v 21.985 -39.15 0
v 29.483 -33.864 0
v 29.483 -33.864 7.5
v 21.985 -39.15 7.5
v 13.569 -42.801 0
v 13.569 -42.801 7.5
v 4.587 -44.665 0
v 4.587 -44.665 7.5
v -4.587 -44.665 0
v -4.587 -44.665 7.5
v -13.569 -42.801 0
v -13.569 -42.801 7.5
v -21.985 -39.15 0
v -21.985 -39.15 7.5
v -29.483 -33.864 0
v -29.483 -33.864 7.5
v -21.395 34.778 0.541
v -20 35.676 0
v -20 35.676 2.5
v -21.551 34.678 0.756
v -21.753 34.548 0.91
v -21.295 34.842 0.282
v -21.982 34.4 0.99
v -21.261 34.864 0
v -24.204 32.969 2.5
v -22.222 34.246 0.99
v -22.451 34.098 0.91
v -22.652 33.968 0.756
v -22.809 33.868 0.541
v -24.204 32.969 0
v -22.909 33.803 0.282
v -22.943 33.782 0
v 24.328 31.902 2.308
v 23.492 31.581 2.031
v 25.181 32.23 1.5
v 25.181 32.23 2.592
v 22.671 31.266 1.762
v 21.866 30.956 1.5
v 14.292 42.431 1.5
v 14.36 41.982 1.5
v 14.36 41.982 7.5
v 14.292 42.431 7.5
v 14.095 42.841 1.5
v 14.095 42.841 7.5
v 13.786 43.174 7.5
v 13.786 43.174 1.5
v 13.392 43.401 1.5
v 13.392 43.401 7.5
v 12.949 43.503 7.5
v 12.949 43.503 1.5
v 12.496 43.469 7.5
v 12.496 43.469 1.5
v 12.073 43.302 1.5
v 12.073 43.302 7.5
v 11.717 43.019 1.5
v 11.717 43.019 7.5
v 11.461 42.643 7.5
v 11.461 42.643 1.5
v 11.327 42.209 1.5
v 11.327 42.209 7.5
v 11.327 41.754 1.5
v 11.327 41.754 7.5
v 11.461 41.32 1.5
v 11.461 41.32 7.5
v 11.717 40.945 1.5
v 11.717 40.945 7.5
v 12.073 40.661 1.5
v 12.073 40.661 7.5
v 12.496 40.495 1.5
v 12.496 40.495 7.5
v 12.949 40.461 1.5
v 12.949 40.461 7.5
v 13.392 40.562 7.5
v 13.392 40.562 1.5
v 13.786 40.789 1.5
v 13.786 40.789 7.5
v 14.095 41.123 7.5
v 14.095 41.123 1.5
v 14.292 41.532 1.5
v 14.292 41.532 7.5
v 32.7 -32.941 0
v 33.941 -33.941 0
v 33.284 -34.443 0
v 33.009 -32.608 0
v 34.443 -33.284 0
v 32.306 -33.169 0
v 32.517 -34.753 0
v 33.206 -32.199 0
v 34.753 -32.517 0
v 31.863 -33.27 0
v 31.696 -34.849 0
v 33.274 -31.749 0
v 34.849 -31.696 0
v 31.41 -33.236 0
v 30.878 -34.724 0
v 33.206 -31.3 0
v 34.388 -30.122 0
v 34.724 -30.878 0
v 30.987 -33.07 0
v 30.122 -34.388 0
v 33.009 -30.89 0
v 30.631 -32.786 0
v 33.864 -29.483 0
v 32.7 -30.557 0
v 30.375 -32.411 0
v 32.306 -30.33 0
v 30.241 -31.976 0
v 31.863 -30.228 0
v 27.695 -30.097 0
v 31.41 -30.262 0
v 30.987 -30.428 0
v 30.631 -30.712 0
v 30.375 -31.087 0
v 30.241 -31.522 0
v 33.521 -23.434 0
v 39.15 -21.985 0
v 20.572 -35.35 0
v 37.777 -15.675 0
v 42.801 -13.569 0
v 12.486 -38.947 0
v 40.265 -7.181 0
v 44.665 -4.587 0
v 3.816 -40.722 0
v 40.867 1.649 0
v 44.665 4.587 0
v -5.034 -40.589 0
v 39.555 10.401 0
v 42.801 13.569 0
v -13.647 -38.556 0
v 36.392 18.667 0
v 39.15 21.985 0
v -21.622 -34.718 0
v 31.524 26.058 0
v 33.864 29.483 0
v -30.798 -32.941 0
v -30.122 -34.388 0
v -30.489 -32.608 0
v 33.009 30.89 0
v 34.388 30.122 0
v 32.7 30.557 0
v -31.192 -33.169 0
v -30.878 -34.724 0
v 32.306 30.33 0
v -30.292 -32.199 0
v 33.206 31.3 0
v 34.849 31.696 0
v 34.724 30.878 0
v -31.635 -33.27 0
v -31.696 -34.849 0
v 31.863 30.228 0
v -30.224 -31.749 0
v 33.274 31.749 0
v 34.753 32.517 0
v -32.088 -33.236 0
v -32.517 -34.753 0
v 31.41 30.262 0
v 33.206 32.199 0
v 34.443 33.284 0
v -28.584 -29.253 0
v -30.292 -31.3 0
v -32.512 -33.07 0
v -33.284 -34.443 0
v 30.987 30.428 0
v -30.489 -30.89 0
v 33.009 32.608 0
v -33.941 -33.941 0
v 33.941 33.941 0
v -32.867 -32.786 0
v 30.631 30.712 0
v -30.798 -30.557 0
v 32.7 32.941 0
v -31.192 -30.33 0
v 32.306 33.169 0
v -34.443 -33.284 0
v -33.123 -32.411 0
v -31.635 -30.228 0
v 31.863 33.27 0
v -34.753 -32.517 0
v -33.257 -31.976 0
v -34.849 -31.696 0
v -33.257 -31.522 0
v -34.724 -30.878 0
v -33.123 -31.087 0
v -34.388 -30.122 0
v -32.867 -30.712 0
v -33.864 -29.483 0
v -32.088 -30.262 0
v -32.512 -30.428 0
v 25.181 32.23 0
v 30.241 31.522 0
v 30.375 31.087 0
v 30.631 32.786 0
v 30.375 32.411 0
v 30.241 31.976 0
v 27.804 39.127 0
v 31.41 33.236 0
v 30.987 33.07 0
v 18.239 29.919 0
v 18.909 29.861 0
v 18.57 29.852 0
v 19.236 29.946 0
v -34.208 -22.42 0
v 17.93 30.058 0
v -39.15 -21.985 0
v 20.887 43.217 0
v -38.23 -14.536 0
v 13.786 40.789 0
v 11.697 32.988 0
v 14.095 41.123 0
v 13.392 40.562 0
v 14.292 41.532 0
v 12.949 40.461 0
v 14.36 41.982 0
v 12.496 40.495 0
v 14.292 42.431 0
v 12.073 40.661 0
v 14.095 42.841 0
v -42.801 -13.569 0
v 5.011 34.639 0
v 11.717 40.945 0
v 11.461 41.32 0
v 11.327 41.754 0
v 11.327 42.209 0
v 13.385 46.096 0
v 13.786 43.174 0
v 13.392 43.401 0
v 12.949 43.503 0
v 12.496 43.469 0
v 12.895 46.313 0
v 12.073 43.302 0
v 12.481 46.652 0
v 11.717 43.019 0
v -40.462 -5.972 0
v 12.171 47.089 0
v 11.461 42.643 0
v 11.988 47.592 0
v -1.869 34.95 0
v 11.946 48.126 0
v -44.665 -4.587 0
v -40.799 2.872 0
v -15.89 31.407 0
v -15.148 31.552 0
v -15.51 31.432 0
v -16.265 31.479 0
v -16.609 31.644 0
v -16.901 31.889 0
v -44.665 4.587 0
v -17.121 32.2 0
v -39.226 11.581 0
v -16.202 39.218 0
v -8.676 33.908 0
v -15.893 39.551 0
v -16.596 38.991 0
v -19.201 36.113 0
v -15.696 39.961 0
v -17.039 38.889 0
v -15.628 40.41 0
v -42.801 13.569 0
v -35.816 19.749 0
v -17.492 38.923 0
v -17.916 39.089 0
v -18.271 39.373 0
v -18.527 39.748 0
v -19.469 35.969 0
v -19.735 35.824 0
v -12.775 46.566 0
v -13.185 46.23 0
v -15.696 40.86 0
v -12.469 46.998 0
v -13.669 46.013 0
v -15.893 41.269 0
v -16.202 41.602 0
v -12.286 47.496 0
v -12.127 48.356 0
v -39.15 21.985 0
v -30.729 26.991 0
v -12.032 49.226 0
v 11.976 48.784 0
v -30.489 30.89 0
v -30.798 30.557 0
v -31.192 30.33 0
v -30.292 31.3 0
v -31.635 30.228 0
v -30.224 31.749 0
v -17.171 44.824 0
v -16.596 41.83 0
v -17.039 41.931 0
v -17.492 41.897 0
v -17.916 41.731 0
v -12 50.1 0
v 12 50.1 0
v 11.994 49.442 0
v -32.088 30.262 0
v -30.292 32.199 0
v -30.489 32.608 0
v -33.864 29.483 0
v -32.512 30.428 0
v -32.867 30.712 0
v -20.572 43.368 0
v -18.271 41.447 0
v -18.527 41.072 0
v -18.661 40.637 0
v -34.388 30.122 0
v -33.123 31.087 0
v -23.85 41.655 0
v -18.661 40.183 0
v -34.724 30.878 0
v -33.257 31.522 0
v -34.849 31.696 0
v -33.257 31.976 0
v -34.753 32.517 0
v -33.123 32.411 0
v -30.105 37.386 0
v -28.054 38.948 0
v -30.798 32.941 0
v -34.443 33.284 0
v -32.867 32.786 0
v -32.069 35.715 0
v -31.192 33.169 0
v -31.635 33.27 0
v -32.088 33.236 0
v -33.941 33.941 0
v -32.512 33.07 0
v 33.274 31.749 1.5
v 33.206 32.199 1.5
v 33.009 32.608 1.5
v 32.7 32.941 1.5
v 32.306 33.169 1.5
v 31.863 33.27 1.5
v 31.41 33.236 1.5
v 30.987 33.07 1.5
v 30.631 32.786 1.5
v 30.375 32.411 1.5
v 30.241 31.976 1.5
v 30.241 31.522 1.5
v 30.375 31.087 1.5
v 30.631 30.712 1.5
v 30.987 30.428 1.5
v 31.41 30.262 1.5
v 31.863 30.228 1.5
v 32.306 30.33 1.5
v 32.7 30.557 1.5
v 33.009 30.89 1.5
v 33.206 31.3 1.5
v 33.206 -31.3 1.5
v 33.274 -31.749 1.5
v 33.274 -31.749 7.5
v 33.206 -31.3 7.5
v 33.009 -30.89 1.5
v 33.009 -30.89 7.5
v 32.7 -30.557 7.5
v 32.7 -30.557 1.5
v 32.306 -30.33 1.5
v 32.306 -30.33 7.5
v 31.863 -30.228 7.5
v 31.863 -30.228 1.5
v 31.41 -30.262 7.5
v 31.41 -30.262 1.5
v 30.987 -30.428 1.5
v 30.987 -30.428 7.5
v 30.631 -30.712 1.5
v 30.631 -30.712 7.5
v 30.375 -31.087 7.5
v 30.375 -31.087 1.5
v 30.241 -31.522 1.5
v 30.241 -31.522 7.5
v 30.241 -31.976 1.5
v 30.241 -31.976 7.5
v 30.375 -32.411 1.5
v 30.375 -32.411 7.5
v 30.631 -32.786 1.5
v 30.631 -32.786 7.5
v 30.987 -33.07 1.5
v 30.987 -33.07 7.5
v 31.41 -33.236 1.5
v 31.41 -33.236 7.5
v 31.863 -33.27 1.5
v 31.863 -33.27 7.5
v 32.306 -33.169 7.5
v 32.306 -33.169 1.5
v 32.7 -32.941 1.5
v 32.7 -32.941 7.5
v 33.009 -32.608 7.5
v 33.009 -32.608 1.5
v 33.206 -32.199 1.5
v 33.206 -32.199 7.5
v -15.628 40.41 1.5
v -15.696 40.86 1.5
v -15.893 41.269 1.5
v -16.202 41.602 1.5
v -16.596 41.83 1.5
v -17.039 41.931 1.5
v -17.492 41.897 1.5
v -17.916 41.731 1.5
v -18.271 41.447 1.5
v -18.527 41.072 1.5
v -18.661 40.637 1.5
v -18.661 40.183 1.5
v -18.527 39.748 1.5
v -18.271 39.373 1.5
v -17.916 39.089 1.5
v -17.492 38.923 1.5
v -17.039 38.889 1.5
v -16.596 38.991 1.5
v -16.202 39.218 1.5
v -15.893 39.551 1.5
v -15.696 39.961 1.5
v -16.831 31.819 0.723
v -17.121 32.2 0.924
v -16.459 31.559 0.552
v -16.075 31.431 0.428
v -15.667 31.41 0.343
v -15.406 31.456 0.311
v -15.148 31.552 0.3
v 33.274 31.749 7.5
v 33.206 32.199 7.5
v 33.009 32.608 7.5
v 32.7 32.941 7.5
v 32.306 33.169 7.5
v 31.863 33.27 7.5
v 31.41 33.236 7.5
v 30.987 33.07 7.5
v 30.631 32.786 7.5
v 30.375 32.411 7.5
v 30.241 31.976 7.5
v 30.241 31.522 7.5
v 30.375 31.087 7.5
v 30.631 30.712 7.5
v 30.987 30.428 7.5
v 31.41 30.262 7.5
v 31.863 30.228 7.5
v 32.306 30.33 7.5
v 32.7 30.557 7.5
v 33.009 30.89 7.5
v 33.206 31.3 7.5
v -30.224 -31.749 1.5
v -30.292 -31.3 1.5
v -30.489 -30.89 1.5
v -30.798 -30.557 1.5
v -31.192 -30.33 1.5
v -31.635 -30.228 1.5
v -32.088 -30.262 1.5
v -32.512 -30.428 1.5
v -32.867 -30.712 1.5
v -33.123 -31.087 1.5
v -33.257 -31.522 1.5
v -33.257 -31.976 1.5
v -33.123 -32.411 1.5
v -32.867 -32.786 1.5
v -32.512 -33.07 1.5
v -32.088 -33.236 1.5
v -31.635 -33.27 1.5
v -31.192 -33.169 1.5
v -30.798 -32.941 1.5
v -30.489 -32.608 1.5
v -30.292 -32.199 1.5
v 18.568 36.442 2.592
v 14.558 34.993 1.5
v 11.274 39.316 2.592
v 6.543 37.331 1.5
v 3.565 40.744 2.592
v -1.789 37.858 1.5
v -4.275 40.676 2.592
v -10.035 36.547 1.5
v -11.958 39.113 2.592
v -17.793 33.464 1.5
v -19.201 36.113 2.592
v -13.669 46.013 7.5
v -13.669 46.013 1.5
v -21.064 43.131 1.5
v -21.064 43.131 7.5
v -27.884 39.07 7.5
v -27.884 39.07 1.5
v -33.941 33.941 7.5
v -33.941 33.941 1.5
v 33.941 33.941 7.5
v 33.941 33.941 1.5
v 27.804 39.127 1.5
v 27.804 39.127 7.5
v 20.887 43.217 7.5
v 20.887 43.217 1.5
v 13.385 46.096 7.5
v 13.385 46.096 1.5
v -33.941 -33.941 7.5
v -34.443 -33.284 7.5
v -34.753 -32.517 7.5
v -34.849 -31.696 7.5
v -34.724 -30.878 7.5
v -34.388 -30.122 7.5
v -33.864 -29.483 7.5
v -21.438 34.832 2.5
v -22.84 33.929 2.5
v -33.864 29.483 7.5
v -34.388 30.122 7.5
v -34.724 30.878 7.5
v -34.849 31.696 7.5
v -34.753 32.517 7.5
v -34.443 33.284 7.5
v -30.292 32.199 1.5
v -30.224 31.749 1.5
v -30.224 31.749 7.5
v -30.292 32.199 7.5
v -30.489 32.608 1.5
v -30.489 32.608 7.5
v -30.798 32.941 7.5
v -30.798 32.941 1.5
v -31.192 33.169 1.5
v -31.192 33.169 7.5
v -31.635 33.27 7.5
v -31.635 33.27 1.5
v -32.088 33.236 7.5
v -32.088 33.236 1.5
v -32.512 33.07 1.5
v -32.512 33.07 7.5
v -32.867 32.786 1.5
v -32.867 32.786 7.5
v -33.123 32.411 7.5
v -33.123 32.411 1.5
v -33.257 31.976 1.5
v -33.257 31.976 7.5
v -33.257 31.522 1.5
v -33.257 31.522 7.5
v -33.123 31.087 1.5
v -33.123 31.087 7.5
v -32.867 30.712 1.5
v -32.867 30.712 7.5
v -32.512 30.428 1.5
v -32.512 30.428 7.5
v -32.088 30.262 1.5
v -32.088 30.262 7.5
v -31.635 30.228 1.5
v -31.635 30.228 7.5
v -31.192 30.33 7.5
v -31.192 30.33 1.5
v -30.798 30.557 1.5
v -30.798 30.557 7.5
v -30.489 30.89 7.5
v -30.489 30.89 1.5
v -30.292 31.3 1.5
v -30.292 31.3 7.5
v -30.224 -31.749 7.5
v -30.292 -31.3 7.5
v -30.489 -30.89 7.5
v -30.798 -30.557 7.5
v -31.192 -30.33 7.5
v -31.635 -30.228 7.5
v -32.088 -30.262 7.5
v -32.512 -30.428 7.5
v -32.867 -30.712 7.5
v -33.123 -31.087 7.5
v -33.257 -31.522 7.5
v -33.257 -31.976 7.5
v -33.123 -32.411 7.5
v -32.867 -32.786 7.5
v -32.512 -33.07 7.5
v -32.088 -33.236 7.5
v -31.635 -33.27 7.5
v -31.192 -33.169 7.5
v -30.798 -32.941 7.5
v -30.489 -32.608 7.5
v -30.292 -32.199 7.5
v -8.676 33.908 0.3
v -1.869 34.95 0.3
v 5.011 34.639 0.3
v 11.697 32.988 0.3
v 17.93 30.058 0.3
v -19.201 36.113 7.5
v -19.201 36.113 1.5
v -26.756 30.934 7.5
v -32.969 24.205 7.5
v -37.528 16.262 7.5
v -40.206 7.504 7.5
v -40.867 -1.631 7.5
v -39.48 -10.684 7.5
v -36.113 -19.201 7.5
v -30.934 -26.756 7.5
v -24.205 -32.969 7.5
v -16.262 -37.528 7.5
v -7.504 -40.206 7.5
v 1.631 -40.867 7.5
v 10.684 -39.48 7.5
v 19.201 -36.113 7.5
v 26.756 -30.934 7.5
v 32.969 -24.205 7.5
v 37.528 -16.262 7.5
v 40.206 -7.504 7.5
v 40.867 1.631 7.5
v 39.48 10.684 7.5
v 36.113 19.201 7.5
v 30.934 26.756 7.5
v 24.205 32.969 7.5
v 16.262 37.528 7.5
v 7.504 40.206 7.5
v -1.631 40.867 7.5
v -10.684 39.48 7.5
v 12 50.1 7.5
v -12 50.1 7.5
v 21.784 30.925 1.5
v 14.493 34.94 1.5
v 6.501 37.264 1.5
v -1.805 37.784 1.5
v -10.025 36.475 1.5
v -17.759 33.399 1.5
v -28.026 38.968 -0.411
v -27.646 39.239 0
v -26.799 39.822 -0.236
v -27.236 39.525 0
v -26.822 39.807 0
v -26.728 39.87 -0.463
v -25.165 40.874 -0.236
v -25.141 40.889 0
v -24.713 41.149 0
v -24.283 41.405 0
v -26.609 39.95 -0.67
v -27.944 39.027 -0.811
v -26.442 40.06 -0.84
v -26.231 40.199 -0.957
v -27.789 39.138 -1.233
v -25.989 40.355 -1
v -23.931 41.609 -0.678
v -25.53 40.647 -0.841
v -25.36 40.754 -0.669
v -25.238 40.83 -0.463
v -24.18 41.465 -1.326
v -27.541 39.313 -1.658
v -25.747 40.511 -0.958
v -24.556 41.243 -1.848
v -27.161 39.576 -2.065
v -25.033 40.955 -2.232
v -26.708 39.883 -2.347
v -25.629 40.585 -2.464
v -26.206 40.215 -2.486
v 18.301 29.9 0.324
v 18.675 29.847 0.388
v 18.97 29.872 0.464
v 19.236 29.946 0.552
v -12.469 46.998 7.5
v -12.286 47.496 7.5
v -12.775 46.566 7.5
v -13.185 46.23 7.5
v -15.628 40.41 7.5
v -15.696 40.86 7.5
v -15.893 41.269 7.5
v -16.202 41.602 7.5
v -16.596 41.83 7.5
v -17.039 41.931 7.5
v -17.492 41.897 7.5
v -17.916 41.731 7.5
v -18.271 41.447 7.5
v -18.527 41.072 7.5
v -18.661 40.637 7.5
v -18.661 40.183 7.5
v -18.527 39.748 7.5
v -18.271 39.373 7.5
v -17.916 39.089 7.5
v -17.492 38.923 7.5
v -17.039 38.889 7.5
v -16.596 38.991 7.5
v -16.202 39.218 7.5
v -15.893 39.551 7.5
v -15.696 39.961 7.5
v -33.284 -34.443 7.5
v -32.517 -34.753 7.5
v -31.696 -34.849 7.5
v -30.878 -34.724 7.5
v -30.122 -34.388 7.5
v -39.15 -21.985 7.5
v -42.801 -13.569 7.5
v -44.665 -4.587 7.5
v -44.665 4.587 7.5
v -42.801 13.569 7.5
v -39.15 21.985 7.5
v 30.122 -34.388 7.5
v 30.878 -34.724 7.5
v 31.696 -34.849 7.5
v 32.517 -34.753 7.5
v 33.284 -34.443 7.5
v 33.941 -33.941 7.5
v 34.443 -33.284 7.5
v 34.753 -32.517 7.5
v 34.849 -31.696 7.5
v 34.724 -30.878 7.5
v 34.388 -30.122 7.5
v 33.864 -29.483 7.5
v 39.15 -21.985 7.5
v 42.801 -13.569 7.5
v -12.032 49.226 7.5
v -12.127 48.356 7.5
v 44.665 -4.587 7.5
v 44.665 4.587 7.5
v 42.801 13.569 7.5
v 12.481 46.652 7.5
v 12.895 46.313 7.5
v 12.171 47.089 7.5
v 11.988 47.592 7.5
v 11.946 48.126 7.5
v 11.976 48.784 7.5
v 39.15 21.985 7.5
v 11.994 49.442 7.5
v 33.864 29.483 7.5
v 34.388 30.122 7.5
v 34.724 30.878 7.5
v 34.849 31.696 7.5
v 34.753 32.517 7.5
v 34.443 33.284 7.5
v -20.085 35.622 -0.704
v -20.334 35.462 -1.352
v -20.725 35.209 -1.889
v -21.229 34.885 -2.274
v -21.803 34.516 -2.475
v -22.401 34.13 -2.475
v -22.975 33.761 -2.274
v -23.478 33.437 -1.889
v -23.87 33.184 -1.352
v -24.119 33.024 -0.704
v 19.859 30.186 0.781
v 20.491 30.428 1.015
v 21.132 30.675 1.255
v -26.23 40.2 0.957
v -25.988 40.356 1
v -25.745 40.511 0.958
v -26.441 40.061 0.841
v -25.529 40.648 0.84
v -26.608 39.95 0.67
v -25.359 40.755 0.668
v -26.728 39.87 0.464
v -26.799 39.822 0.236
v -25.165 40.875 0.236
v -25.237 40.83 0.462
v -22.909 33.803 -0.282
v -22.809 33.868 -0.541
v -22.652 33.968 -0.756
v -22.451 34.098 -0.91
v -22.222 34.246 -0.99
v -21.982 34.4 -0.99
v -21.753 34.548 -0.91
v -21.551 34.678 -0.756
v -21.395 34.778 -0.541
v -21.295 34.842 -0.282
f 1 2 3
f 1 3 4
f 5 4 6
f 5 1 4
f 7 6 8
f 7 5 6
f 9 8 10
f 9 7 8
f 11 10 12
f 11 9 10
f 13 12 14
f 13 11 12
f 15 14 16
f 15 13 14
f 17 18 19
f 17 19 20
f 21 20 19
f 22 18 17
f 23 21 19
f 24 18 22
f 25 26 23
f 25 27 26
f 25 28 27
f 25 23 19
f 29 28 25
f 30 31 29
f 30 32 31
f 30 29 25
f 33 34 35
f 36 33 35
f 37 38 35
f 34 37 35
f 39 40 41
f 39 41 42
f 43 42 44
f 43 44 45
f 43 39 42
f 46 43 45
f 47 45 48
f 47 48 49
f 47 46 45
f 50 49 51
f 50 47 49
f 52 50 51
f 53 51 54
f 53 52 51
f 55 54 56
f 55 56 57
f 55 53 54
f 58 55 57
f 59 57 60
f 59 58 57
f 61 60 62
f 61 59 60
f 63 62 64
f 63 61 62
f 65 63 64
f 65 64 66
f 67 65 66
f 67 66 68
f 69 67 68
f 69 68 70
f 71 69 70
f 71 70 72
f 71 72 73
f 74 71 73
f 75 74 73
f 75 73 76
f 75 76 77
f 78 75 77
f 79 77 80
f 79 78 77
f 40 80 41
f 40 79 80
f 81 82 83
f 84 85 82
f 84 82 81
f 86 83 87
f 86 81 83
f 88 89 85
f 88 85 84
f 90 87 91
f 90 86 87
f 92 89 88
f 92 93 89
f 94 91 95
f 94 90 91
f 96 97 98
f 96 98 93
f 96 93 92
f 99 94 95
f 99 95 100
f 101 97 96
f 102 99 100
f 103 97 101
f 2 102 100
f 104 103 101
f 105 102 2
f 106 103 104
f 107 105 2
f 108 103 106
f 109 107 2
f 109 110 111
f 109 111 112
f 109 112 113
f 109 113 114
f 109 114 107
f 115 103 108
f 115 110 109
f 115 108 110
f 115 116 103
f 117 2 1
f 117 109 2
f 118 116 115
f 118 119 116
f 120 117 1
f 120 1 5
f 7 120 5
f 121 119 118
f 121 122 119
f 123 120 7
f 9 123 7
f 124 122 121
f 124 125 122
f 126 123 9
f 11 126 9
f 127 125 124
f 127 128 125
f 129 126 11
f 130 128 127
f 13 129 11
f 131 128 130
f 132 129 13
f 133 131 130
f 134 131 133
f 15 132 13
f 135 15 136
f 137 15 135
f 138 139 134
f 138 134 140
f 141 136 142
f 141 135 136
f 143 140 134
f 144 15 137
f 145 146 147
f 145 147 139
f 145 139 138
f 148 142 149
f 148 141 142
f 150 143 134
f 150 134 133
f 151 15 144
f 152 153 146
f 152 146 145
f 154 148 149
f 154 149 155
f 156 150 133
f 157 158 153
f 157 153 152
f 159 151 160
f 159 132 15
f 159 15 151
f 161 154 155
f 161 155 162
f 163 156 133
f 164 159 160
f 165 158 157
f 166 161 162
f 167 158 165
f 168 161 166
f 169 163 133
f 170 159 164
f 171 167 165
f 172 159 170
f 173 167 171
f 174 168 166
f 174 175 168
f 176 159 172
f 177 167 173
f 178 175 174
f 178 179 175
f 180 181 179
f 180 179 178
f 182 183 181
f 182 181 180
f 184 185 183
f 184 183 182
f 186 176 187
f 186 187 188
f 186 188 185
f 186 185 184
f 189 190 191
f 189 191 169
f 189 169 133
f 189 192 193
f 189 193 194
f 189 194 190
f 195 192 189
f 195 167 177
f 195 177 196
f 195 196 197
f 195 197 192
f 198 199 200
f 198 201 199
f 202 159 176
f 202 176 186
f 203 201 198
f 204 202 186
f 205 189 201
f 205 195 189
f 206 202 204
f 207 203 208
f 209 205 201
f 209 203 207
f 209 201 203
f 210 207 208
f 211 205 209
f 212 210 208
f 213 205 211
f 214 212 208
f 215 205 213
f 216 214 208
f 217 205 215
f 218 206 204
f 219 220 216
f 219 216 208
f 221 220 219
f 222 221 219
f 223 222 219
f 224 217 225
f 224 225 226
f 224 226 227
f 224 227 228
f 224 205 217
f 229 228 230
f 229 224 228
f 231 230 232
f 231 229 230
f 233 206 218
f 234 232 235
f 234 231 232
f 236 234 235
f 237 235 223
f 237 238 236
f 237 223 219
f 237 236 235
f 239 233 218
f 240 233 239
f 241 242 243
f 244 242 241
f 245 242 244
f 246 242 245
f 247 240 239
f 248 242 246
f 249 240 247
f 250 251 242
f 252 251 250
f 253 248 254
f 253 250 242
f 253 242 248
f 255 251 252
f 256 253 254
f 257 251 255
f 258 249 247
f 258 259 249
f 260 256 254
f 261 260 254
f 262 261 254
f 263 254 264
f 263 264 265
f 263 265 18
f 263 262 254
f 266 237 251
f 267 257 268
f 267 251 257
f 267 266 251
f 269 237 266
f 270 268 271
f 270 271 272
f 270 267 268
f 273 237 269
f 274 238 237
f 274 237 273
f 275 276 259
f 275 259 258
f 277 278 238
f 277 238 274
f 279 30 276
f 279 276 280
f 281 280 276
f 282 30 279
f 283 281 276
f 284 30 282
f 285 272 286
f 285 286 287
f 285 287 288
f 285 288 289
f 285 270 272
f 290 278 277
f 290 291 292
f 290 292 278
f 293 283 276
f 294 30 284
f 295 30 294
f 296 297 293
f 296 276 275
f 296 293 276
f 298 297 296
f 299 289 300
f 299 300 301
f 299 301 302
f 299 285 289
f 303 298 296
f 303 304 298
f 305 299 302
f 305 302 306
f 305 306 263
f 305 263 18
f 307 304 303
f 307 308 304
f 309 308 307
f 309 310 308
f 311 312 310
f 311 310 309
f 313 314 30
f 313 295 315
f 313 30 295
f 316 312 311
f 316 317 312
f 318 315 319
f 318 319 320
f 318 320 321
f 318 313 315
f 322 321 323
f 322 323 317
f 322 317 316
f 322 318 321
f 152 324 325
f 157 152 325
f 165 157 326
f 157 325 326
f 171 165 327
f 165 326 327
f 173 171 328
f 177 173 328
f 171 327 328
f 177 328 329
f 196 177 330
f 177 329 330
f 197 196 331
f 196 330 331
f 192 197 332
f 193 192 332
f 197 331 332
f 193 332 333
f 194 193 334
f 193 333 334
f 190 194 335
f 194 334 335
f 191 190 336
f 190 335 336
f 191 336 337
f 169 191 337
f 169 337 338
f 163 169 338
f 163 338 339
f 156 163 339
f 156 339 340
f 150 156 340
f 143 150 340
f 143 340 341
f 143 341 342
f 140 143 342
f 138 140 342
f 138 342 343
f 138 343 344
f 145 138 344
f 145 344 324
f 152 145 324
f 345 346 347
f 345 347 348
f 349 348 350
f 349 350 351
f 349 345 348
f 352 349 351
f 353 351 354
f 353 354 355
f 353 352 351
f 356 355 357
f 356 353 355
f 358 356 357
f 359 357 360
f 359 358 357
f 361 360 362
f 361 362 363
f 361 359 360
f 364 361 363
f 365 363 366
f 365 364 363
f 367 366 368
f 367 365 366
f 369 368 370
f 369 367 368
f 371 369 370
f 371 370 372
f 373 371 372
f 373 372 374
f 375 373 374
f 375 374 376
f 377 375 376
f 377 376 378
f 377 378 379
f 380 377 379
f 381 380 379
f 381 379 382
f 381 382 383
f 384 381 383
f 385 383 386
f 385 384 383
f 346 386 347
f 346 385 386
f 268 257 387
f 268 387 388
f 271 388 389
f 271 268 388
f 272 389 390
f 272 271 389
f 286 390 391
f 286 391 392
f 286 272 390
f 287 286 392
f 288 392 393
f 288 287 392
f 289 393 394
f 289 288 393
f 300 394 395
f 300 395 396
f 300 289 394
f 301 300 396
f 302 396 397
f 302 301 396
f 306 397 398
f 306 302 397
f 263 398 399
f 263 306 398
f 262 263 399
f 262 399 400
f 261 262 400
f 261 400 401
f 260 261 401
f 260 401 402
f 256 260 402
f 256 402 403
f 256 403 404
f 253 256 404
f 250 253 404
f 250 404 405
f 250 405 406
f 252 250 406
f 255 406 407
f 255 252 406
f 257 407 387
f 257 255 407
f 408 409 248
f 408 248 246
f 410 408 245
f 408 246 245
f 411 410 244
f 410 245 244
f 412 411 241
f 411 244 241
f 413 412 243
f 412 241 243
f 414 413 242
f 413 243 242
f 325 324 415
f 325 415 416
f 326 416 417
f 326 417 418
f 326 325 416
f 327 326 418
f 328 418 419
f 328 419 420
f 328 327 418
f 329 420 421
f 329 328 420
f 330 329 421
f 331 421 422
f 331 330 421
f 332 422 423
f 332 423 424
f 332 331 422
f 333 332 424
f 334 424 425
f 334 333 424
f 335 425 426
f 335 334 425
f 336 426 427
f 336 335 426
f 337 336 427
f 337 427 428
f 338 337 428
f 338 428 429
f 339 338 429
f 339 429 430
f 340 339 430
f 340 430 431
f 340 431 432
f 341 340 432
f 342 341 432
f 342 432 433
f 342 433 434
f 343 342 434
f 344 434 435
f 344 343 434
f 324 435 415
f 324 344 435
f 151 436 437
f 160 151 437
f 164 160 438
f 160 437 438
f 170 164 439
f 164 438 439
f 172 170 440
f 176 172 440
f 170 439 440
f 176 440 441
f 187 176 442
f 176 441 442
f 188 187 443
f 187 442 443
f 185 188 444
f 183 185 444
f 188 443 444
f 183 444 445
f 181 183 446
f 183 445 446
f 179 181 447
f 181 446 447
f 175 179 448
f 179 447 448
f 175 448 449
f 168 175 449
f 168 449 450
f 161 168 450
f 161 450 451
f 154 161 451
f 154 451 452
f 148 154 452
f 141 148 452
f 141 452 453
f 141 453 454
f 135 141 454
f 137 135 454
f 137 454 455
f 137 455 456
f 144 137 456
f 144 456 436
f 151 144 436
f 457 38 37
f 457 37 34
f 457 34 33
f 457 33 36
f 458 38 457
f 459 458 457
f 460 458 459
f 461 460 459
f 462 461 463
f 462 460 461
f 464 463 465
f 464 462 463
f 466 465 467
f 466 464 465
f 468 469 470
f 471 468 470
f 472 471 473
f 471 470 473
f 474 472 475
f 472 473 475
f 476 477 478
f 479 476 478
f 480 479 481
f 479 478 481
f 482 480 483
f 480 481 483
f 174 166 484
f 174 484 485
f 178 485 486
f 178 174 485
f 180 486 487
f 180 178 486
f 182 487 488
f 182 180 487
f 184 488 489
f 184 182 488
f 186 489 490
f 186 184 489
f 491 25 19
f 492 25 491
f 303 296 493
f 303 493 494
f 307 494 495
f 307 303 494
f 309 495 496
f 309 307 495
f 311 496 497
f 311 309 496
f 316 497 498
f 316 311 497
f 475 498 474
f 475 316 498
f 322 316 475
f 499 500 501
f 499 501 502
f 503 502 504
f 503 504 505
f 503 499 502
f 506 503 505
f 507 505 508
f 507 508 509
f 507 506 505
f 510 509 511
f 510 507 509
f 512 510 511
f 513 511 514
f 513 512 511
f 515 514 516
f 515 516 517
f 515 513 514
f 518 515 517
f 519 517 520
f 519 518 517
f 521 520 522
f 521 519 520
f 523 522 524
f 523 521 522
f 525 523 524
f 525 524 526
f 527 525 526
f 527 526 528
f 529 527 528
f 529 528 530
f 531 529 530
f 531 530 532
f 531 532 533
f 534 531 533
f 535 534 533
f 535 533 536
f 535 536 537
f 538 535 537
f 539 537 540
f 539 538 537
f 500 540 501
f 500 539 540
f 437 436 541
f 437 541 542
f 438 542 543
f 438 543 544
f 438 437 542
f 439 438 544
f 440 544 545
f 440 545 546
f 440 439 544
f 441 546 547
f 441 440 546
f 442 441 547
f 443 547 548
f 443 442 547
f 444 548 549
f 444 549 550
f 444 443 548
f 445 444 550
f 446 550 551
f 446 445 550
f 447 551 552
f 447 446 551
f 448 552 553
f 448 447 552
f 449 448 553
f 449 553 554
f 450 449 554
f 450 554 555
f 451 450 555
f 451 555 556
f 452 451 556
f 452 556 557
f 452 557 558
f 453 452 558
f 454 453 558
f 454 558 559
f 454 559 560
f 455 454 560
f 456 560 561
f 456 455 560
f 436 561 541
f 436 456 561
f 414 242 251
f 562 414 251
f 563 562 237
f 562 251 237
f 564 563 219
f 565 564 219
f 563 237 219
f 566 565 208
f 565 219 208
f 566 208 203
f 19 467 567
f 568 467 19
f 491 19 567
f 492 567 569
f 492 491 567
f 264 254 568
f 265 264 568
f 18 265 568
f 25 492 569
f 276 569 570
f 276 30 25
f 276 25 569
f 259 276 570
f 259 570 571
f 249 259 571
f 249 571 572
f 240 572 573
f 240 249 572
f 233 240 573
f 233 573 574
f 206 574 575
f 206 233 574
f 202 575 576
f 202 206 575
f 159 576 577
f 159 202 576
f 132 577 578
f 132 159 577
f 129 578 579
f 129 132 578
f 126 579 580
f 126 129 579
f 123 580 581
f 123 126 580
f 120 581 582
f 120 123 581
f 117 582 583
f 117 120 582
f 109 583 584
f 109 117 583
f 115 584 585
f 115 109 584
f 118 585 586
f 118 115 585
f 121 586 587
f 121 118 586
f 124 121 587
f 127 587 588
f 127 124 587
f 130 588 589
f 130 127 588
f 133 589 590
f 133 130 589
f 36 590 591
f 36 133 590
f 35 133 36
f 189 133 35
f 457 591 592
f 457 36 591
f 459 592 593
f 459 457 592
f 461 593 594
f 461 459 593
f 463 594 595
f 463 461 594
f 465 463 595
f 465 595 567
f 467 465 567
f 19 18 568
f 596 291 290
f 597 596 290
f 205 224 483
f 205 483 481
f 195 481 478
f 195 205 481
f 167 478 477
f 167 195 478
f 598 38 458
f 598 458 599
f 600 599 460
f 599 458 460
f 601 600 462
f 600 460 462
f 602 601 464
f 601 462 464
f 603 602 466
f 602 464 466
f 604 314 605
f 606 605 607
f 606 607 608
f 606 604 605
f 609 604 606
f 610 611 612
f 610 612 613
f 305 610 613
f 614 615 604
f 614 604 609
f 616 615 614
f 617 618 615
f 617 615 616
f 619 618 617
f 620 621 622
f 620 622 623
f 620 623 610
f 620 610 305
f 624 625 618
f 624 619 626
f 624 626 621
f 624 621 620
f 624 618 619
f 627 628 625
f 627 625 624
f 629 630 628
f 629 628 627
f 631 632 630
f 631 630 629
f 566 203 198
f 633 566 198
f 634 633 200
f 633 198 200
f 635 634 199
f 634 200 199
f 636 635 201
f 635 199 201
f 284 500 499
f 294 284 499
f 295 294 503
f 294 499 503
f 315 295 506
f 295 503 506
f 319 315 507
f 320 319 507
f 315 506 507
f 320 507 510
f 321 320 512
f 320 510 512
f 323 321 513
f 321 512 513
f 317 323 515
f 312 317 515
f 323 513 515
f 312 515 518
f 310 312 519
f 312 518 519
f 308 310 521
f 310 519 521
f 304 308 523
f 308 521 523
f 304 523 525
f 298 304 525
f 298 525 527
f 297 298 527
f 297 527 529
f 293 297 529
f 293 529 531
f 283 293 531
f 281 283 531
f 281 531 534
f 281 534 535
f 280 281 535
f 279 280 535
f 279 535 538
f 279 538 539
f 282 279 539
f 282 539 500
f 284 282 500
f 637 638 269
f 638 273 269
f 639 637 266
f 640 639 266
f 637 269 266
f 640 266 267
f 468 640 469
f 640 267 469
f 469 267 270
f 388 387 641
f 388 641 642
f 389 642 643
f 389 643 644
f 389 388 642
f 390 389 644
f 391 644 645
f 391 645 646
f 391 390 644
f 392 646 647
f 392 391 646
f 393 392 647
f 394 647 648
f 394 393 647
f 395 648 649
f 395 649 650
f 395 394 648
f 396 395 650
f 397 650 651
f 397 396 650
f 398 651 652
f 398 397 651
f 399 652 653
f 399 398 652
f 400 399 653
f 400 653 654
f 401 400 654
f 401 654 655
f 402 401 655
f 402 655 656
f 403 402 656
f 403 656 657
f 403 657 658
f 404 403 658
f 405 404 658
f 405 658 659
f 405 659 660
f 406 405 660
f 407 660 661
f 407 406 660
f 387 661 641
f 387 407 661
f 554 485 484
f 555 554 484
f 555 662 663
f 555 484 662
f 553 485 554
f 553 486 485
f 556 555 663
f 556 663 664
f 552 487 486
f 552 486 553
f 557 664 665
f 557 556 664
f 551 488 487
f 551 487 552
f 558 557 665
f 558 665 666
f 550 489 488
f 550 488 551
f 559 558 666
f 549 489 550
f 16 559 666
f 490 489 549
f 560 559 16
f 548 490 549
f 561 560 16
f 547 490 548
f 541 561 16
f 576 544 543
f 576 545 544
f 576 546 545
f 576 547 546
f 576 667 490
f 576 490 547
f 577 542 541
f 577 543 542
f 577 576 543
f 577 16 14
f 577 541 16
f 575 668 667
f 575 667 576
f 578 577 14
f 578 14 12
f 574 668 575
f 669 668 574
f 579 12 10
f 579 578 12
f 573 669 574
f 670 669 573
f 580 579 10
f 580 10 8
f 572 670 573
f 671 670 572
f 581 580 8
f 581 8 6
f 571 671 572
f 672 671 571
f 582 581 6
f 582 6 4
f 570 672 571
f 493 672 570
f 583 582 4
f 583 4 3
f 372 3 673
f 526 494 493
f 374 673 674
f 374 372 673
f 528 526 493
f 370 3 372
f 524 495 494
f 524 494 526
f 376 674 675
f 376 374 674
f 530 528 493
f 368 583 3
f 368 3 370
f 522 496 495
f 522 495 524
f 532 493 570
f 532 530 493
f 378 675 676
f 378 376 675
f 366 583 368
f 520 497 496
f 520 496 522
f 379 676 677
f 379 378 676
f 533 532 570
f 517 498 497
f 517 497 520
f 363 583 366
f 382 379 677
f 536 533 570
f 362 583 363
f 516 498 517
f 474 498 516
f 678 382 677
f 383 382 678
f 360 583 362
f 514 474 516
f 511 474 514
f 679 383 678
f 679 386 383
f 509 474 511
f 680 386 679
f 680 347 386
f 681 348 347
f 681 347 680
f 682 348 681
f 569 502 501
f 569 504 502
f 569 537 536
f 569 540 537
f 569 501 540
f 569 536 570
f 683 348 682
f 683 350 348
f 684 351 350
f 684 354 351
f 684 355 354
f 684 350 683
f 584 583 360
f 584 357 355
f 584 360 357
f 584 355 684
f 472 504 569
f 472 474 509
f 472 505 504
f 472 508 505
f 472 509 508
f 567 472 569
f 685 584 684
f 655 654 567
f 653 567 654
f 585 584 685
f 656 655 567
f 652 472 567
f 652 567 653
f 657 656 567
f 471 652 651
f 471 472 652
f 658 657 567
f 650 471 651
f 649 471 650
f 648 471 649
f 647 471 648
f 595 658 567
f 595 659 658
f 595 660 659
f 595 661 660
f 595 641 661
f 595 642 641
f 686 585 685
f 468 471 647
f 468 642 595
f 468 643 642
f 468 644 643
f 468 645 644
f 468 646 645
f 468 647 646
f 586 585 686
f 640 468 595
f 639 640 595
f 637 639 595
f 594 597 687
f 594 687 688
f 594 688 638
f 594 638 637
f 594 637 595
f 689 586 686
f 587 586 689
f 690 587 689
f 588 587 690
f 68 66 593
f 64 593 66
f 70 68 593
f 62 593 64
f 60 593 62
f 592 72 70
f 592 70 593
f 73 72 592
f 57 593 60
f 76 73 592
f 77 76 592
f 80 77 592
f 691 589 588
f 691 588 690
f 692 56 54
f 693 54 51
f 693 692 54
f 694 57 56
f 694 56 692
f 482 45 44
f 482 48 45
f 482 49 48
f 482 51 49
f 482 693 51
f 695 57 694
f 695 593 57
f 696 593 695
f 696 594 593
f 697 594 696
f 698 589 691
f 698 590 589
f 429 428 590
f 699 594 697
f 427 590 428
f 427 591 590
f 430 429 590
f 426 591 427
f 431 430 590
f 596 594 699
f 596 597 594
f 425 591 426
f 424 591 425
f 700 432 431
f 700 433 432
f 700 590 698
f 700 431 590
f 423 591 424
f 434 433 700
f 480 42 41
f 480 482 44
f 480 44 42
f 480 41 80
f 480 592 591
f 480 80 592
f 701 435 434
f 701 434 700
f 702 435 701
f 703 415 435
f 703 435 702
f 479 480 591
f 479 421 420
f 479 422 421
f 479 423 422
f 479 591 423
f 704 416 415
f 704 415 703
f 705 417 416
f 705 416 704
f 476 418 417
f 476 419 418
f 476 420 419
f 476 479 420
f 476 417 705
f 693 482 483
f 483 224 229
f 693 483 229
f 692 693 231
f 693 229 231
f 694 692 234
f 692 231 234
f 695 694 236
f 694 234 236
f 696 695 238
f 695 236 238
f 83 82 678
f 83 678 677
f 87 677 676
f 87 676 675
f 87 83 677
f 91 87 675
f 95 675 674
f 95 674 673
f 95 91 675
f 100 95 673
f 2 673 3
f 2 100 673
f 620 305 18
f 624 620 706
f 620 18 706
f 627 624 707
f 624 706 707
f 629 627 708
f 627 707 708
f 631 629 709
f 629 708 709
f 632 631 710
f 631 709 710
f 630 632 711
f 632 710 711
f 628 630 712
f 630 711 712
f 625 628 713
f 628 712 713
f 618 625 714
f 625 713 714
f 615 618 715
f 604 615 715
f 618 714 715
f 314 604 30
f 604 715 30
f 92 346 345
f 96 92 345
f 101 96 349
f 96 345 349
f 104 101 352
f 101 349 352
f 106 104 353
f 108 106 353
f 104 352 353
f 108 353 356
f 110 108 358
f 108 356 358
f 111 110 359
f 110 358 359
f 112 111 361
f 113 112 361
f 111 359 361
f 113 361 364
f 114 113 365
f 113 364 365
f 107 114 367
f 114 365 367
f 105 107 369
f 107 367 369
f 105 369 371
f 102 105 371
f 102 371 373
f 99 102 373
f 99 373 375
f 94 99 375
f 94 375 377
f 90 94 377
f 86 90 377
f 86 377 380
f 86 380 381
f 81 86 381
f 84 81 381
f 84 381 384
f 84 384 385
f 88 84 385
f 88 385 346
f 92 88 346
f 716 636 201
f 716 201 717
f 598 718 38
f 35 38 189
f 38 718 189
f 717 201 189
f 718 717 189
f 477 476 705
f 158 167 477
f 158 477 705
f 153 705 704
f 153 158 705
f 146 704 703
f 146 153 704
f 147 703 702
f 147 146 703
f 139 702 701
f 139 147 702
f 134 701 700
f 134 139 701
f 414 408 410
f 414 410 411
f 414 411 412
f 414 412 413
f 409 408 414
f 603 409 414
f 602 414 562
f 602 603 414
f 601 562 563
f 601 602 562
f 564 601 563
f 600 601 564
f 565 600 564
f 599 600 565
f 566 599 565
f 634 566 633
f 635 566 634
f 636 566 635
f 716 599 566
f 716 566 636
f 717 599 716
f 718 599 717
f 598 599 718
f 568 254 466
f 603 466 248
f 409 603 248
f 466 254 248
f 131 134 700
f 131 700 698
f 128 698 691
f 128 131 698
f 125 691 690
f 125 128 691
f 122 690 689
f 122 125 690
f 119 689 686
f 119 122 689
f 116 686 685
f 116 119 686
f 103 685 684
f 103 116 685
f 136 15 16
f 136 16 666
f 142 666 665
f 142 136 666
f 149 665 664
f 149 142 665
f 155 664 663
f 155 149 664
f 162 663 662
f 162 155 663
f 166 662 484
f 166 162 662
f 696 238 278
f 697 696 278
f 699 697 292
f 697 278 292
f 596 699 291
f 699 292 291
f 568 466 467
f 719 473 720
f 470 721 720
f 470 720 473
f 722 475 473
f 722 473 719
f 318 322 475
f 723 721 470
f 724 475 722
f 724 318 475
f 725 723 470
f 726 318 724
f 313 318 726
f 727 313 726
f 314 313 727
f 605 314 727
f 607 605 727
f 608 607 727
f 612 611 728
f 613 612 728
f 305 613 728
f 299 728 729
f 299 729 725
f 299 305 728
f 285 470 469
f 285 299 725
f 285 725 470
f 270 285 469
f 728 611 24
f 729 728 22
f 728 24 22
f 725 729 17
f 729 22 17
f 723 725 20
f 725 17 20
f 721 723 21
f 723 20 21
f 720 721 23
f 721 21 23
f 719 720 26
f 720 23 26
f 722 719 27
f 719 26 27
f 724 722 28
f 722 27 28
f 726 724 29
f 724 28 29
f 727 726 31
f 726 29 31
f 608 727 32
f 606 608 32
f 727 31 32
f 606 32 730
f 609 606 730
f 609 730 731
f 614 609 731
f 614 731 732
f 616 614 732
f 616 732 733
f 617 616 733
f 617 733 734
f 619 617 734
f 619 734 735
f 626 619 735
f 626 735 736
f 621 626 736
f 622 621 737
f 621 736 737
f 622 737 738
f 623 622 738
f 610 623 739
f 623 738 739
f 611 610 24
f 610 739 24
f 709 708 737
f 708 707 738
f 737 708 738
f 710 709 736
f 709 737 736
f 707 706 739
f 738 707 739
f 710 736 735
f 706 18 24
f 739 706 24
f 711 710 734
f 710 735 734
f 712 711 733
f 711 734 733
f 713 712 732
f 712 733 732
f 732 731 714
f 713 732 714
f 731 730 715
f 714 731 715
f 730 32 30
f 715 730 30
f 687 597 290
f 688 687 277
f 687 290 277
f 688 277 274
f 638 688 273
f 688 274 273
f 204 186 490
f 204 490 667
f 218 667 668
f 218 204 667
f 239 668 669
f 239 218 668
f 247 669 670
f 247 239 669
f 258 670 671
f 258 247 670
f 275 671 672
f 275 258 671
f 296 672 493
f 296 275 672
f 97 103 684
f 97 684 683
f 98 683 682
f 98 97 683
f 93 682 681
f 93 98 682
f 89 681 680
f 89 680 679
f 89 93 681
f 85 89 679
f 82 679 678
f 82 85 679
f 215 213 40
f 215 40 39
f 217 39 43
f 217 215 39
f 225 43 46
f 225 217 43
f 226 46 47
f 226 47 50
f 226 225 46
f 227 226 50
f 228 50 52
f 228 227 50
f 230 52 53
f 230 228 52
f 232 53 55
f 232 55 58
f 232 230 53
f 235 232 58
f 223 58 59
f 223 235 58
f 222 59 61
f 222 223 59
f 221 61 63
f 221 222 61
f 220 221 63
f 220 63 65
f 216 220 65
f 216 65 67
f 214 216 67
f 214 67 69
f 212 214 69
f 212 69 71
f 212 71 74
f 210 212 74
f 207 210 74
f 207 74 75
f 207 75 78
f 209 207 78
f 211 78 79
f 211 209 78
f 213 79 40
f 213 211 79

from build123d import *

# Parameters (mm, degrees)
SKETCH_1_R               = 40.9
SKETCH_1_R_2             = 1.525
EXTRUDE_1_DEPTH          = 1.5
EXTRUDE_START            = -1.5
EXTRUDE_2_DEPTH          = 1.5
SKETCH_3_R               = 1.525
CUT_EXTRUDE_1_DEPTH      = 10
SKETCH_4_R               = 1.525
SKETCH_4_R_2             = 40.9
EXTRUDE_3_DEPTH          = 6
CUT_EXTRUDE_2_DEPTH      = 70.787248119
CUT_EXTRUDE_2_DEPTH_BACK = 70.787248119
EXTRUDE_4_DEPTH          = 2.5
EXTRUDE_5_REACH          = 106.028
EXTRUDE_5_END_RADIUS     = 48
SKETCH_9_R               = 1
CUT_EXTRUDE_3_DEPTH      = 105.027800787
CHAMFER_1_SIZE           = 1.2
CHAMFER_1_SIZE_2         = 2.827022839
CHAMFER_2_SIZE           = 1.091910703
CHAMFER_2_SIZE_2         = 3


with BuildPart() as part:
    # 草图1 → 凸台-拉伸1 (new body)
    with BuildSketch(Plane.XY):
        with BuildLine():
            Line((-12, 50.1), (12, 50.1))
            ThreePointArc((12, 50.1), (11.98646104, 49.112770637), (11.945854344, 48.126283833))
            ThreePointArc((11.945854344, 48.126283833), (12.311228539, 46.859989672), (13.385132402, 46.095967617))
            ThreePointArc((13.385132402, 46.095967617), (0.147817484, -47.999772395), (-13.668785094, 46.012653847))
            ThreePointArc((-13.668785094, 46.012653847), (-12.775478285, 46.565992731), (-12.285981368, 47.495817309))
            ThreePointArc((-12.285981368, 47.495817309), (-12.071709603, 48.790080839), (-12, 50.1))
        make_face()
        Circle(SKETCH_1_R, mode=Mode.SUBTRACT)
        with Locations((-17.153096541, 40.410163067)):
            Circle(SKETCH_1_R_2, mode=Mode.SUBTRACT)
        with Locations((12.835117837, 41.981778787)):
            Circle(SKETCH_1_R_2, mode=Mode.SUBTRACT)
    extrude(amount=EXTRUDE_1_DEPTH)

    # 草图2 → 凸台-拉伸2 (add)
    with BuildSketch(Plane.XY.offset(1.5).offset(EXTRUDE_START)):
        with BuildLine():
            Line((-19.201386918, 36.112556548), (-17.121235913, 32.200361501))
            ThreePointArc((-17.121235913, 32.200361501), (-16.264760822, 31.479428059), (-15.147630365, 31.55232629))
            ThreePointArc((-15.147630365, 31.55232629), (1.579071216, 34.964360914), (17.930115588, 30.058458959))
            ThreePointArc((17.930115588, 30.058458959), (18.570370617, 29.852165239), (19.236402831, 29.946423874))
            Line((19.236402831, 29.946423874), (25.180554341, 32.229639823))
            ThreePointArc((25.180554341, 32.229639823), (3.564669878, 40.744363152), (-19.201386918, 36.112556548))
        make_face()
    extrude(amount=EXTRUDE_2_DEPTH)

    # 草图3 → 切除-拉伸1 (cut)
    with BuildSketch(Plane.XY.offset(1.5)):
        with Locations((-31.749094475, 31.749094475)):
            Circle(SKETCH_3_R)
        with Locations((31.749094475, 31.749094475)):
            Circle(SKETCH_3_R)
        with Locations((31.749094475, -31.749094475)):
            Circle(SKETCH_3_R)
        with Locations((-31.749094475, -31.749094475)):
            Circle(SKETCH_3_R)
    extrude(amount=-CUT_EXTRUDE_1_DEPTH, mode=Mode.SUBTRACT)

    # 草图4 → 凸台-拉伸3 (add)
    with BuildSketch(Plane.XY.offset(1.5)):
        with BuildLine():
            Line((12, 50.1), (-12, 50.1))
            ThreePointArc((-12, 50.1), (-12.071709603, 48.790080839), (-12.285981368, 47.495817309))
            ThreePointArc((-12.285981368, 47.495817309), (-12.775478285, 46.565992731), (-13.668785094, 46.012653847))
            ThreePointArc((-13.668785094, 46.012653847), (0.147817484, -47.999772395), (13.385132402, 46.095967617))
            ThreePointArc((13.385132402, 46.095967617), (12.311228539, 46.859989672), (11.945854344, 48.126283833))
            ThreePointArc((11.945854344, 48.126283833), (11.98646104, 49.112770637), (12, 50.1))
        make_face()
        with Locations((-31.749094475, -31.749094475)):
            Circle(SKETCH_4_R, mode=Mode.SUBTRACT)
        with Locations((31.749094475, -31.749094475)):
            Circle(SKETCH_4_R, mode=Mode.SUBTRACT)
        with Locations((31.749094475, 31.749094475)):
            Circle(SKETCH_4_R, mode=Mode.SUBTRACT)
        with Locations((12.835117837, 41.981778787)):
            Circle(SKETCH_4_R, mode=Mode.SUBTRACT)
        with Locations((-31.749094475, 31.749094475)):
            Circle(SKETCH_4_R, mode=Mode.SUBTRACT)
        with Locations((-17.153096541, 40.410163067)):
            Circle(SKETCH_4_R, mode=Mode.SUBTRACT)
        with Locations(Location((0, 0, 0), (0, 0, 118))):
            Circle(SKETCH_4_R_2, mode=Mode.SUBTRACT)
    extrude(amount=EXTRUDE_3_DEPTH)

    # 草图5 → 切除-拉伸2 (cut, two sides: drawn at the far end of the back side and taken through both)
    with BuildSketch(Plane.XY.offset(7.5).offset(-CUT_EXTRUDE_2_DEPTH_BACK)):
        with BuildLine():
            ThreePointArc((-33.864147525, 29.482698526), (-34.848632515, 31.695578705), (-33.941125497, 33.941125497))
            ThreePointArc((-33.941125497, 33.941125497), (-48, 0), (-33.941125497, -33.941125497))
            ThreePointArc((-33.941125497, -33.941125497), (-34.848632515, -31.695578705), (-33.864147525, -29.482698526))
            ThreePointArc((-33.864147525, -29.482698526), (-44.9, 0), (-33.864147525, 29.482698526))
        make_face()
        with BuildLine():
            ThreePointArc((-29.482698526, -33.864147525), (-31.695578705, -34.848632515), (-33.941125497, -33.941125497))
            ThreePointArc((-33.941125497, -33.941125497), (1.4e-08, -48), (33.941125517, -33.941125477))
            ThreePointArc((33.941125517, -33.941125477), (31.695578719, -34.848632516), (29.482698526, -33.864147525))
            ThreePointArc((29.482698526, -33.864147525), (0, -44.9), (-29.482698526, -33.864147525))
        make_face()
        with BuildLine():
            ThreePointArc((33.864147525, -29.482698526), (34.848632515, -31.695578691), (33.941125517, -33.941125477))
            ThreePointArc((33.941125517, -33.941125477), (48, 1.4e-08), (33.941125497, 33.941125497))
            ThreePointArc((33.941125497, 33.941125497), (34.848632515, 31.695578705), (33.864147525, 29.482698526))
            ThreePointArc((33.864147525, 29.482698526), (44.9, 0), (33.864147525, -29.482698526))
        make_face()
    extrude(amount=CUT_EXTRUDE_2_DEPTH + CUT_EXTRUDE_2_DEPTH_BACK, mode=Mode.SUBTRACT)

    # 草图6 → 凸台-拉伸4 (add)
    with BuildSketch(Plane(origin=(0, 0, 0), x_dir=(-1, 0, 0), z_dir=(0, 0, -1))):
        with BuildLine():
            Line((20, 35.676462829), (24.203821377, 32.969456027))
            ThreePointArc((24.203821377, 32.969456027), (22.14331564, 34.387258868), (20, 35.676462829))
        make_face()
    extrude(amount=-EXTRUDE_4_DEPTH)

    # 凸台-拉伸5: up to this cylinder (the profile starts inside it)
    extrude_5_end = Plane(origin=(0, 0, -1.061033), z_dir=(0, 0, -1)) * Cylinder(EXTRUDE_5_END_RADIUS, 309.056, mode=Mode.PRIVATE)
    # 草图8 → 凸台-拉伸5 (add, up to the surface)
    with BuildSketch(Plane(origin=(-22.101910689, 34.322959428, 0), x_dir=(0.8407642754995168, 0.5414013604007407, 0), z_dir=(0.5414013604007407, -0.8407642754995168, 0)), mode=Mode.PRIVATE) as extrude_5_sk1:
        with BuildLine():
            Line((-2.5, 0), (2.5, 0))
            ThreePointArc((2.5, 0), (0, -2.5), (-2.5, 0))
        make_face()
    extrude_5_tool1 = extrude(extrude_5_sk1.sketch, amount=-EXTRUDE_5_REACH, mode=Mode.PRIVATE) & extrude_5_end
    add(extrude_5_tool1.solids().sort_by_distance((-22.101911, 34.322959, -1.061033))[0])

    # 草图9 → 切除-拉伸3 (cut, through all)
    with BuildSketch(Plane(origin=(-22.101910689, 34.322959428, 0), x_dir=(0.8407642754995168, 0.5414013604007407, 0), z_dir=(0.5414013604007407, -0.8407642754995168, 0))):
        Circle(SKETCH_9_R)
    extrude(amount=-CUT_EXTRUDE_3_DEPTH, mode=Mode.SUBTRACT)

    # 倒角1
    # the kernel refuses this chamfer: 2.827022839, 1.2 mm, written as the material it takes off along each edge
    with BuildSketch(Plane(origin=(0, 0, 1.5), x_dir=(-0.6107495991650607, 0.79182379802562, 0), z_dir=(-0.79182379802562, -0.6107495991650607, 0))) as chamfer_1_piece_1:
        Polygon((35, CHAMFER_1_SIZE), (35 + CHAMFER_1_SIZE_2, 0), (35, 0), align=None)
    revolve(axis=Axis((0, 0, 1.5), (0, 0, -1)), revolution_arc=80.459152239, mode=Mode.SUBTRACT)

    # 倒角2
    # the kernel refuses this chamfer: 3, 1.091910703 mm, written as the material it adds along each edge
    with BuildSketch(Plane(origin=(0, 0, 1.5), x_dir=(0.7536182445133375, 0.6573123622271496, 0), z_dir=(0.6573123622271496, -0.7536182445133375, 0))) as chamfer_2_piece_1_section:
        Polygon((40.9, CHAMFER_2_SIZE), (40.9 - CHAMFER_2_SIZE_2, 0), (40.9, 0), align=None)
    chamfer_2_piece_1 = revolve(axis=Axis((0, 0, 1.5), (0, 0, 1)), revolution_arc=76.90478106, mode=Mode.PRIVATE)
    chamfer_2_piece_1 = split(chamfer_2_piece_1, bisect_by=Plane(origin=(8.613354957, 25.865990815, 2.004229424), z_dir=(-0.35856914515570787, 0.933503169861948, 0)), keep=Keep.TOP, mode=Mode.PRIVATE)
    add(chamfer_2_piece_1)


solid = part.part
